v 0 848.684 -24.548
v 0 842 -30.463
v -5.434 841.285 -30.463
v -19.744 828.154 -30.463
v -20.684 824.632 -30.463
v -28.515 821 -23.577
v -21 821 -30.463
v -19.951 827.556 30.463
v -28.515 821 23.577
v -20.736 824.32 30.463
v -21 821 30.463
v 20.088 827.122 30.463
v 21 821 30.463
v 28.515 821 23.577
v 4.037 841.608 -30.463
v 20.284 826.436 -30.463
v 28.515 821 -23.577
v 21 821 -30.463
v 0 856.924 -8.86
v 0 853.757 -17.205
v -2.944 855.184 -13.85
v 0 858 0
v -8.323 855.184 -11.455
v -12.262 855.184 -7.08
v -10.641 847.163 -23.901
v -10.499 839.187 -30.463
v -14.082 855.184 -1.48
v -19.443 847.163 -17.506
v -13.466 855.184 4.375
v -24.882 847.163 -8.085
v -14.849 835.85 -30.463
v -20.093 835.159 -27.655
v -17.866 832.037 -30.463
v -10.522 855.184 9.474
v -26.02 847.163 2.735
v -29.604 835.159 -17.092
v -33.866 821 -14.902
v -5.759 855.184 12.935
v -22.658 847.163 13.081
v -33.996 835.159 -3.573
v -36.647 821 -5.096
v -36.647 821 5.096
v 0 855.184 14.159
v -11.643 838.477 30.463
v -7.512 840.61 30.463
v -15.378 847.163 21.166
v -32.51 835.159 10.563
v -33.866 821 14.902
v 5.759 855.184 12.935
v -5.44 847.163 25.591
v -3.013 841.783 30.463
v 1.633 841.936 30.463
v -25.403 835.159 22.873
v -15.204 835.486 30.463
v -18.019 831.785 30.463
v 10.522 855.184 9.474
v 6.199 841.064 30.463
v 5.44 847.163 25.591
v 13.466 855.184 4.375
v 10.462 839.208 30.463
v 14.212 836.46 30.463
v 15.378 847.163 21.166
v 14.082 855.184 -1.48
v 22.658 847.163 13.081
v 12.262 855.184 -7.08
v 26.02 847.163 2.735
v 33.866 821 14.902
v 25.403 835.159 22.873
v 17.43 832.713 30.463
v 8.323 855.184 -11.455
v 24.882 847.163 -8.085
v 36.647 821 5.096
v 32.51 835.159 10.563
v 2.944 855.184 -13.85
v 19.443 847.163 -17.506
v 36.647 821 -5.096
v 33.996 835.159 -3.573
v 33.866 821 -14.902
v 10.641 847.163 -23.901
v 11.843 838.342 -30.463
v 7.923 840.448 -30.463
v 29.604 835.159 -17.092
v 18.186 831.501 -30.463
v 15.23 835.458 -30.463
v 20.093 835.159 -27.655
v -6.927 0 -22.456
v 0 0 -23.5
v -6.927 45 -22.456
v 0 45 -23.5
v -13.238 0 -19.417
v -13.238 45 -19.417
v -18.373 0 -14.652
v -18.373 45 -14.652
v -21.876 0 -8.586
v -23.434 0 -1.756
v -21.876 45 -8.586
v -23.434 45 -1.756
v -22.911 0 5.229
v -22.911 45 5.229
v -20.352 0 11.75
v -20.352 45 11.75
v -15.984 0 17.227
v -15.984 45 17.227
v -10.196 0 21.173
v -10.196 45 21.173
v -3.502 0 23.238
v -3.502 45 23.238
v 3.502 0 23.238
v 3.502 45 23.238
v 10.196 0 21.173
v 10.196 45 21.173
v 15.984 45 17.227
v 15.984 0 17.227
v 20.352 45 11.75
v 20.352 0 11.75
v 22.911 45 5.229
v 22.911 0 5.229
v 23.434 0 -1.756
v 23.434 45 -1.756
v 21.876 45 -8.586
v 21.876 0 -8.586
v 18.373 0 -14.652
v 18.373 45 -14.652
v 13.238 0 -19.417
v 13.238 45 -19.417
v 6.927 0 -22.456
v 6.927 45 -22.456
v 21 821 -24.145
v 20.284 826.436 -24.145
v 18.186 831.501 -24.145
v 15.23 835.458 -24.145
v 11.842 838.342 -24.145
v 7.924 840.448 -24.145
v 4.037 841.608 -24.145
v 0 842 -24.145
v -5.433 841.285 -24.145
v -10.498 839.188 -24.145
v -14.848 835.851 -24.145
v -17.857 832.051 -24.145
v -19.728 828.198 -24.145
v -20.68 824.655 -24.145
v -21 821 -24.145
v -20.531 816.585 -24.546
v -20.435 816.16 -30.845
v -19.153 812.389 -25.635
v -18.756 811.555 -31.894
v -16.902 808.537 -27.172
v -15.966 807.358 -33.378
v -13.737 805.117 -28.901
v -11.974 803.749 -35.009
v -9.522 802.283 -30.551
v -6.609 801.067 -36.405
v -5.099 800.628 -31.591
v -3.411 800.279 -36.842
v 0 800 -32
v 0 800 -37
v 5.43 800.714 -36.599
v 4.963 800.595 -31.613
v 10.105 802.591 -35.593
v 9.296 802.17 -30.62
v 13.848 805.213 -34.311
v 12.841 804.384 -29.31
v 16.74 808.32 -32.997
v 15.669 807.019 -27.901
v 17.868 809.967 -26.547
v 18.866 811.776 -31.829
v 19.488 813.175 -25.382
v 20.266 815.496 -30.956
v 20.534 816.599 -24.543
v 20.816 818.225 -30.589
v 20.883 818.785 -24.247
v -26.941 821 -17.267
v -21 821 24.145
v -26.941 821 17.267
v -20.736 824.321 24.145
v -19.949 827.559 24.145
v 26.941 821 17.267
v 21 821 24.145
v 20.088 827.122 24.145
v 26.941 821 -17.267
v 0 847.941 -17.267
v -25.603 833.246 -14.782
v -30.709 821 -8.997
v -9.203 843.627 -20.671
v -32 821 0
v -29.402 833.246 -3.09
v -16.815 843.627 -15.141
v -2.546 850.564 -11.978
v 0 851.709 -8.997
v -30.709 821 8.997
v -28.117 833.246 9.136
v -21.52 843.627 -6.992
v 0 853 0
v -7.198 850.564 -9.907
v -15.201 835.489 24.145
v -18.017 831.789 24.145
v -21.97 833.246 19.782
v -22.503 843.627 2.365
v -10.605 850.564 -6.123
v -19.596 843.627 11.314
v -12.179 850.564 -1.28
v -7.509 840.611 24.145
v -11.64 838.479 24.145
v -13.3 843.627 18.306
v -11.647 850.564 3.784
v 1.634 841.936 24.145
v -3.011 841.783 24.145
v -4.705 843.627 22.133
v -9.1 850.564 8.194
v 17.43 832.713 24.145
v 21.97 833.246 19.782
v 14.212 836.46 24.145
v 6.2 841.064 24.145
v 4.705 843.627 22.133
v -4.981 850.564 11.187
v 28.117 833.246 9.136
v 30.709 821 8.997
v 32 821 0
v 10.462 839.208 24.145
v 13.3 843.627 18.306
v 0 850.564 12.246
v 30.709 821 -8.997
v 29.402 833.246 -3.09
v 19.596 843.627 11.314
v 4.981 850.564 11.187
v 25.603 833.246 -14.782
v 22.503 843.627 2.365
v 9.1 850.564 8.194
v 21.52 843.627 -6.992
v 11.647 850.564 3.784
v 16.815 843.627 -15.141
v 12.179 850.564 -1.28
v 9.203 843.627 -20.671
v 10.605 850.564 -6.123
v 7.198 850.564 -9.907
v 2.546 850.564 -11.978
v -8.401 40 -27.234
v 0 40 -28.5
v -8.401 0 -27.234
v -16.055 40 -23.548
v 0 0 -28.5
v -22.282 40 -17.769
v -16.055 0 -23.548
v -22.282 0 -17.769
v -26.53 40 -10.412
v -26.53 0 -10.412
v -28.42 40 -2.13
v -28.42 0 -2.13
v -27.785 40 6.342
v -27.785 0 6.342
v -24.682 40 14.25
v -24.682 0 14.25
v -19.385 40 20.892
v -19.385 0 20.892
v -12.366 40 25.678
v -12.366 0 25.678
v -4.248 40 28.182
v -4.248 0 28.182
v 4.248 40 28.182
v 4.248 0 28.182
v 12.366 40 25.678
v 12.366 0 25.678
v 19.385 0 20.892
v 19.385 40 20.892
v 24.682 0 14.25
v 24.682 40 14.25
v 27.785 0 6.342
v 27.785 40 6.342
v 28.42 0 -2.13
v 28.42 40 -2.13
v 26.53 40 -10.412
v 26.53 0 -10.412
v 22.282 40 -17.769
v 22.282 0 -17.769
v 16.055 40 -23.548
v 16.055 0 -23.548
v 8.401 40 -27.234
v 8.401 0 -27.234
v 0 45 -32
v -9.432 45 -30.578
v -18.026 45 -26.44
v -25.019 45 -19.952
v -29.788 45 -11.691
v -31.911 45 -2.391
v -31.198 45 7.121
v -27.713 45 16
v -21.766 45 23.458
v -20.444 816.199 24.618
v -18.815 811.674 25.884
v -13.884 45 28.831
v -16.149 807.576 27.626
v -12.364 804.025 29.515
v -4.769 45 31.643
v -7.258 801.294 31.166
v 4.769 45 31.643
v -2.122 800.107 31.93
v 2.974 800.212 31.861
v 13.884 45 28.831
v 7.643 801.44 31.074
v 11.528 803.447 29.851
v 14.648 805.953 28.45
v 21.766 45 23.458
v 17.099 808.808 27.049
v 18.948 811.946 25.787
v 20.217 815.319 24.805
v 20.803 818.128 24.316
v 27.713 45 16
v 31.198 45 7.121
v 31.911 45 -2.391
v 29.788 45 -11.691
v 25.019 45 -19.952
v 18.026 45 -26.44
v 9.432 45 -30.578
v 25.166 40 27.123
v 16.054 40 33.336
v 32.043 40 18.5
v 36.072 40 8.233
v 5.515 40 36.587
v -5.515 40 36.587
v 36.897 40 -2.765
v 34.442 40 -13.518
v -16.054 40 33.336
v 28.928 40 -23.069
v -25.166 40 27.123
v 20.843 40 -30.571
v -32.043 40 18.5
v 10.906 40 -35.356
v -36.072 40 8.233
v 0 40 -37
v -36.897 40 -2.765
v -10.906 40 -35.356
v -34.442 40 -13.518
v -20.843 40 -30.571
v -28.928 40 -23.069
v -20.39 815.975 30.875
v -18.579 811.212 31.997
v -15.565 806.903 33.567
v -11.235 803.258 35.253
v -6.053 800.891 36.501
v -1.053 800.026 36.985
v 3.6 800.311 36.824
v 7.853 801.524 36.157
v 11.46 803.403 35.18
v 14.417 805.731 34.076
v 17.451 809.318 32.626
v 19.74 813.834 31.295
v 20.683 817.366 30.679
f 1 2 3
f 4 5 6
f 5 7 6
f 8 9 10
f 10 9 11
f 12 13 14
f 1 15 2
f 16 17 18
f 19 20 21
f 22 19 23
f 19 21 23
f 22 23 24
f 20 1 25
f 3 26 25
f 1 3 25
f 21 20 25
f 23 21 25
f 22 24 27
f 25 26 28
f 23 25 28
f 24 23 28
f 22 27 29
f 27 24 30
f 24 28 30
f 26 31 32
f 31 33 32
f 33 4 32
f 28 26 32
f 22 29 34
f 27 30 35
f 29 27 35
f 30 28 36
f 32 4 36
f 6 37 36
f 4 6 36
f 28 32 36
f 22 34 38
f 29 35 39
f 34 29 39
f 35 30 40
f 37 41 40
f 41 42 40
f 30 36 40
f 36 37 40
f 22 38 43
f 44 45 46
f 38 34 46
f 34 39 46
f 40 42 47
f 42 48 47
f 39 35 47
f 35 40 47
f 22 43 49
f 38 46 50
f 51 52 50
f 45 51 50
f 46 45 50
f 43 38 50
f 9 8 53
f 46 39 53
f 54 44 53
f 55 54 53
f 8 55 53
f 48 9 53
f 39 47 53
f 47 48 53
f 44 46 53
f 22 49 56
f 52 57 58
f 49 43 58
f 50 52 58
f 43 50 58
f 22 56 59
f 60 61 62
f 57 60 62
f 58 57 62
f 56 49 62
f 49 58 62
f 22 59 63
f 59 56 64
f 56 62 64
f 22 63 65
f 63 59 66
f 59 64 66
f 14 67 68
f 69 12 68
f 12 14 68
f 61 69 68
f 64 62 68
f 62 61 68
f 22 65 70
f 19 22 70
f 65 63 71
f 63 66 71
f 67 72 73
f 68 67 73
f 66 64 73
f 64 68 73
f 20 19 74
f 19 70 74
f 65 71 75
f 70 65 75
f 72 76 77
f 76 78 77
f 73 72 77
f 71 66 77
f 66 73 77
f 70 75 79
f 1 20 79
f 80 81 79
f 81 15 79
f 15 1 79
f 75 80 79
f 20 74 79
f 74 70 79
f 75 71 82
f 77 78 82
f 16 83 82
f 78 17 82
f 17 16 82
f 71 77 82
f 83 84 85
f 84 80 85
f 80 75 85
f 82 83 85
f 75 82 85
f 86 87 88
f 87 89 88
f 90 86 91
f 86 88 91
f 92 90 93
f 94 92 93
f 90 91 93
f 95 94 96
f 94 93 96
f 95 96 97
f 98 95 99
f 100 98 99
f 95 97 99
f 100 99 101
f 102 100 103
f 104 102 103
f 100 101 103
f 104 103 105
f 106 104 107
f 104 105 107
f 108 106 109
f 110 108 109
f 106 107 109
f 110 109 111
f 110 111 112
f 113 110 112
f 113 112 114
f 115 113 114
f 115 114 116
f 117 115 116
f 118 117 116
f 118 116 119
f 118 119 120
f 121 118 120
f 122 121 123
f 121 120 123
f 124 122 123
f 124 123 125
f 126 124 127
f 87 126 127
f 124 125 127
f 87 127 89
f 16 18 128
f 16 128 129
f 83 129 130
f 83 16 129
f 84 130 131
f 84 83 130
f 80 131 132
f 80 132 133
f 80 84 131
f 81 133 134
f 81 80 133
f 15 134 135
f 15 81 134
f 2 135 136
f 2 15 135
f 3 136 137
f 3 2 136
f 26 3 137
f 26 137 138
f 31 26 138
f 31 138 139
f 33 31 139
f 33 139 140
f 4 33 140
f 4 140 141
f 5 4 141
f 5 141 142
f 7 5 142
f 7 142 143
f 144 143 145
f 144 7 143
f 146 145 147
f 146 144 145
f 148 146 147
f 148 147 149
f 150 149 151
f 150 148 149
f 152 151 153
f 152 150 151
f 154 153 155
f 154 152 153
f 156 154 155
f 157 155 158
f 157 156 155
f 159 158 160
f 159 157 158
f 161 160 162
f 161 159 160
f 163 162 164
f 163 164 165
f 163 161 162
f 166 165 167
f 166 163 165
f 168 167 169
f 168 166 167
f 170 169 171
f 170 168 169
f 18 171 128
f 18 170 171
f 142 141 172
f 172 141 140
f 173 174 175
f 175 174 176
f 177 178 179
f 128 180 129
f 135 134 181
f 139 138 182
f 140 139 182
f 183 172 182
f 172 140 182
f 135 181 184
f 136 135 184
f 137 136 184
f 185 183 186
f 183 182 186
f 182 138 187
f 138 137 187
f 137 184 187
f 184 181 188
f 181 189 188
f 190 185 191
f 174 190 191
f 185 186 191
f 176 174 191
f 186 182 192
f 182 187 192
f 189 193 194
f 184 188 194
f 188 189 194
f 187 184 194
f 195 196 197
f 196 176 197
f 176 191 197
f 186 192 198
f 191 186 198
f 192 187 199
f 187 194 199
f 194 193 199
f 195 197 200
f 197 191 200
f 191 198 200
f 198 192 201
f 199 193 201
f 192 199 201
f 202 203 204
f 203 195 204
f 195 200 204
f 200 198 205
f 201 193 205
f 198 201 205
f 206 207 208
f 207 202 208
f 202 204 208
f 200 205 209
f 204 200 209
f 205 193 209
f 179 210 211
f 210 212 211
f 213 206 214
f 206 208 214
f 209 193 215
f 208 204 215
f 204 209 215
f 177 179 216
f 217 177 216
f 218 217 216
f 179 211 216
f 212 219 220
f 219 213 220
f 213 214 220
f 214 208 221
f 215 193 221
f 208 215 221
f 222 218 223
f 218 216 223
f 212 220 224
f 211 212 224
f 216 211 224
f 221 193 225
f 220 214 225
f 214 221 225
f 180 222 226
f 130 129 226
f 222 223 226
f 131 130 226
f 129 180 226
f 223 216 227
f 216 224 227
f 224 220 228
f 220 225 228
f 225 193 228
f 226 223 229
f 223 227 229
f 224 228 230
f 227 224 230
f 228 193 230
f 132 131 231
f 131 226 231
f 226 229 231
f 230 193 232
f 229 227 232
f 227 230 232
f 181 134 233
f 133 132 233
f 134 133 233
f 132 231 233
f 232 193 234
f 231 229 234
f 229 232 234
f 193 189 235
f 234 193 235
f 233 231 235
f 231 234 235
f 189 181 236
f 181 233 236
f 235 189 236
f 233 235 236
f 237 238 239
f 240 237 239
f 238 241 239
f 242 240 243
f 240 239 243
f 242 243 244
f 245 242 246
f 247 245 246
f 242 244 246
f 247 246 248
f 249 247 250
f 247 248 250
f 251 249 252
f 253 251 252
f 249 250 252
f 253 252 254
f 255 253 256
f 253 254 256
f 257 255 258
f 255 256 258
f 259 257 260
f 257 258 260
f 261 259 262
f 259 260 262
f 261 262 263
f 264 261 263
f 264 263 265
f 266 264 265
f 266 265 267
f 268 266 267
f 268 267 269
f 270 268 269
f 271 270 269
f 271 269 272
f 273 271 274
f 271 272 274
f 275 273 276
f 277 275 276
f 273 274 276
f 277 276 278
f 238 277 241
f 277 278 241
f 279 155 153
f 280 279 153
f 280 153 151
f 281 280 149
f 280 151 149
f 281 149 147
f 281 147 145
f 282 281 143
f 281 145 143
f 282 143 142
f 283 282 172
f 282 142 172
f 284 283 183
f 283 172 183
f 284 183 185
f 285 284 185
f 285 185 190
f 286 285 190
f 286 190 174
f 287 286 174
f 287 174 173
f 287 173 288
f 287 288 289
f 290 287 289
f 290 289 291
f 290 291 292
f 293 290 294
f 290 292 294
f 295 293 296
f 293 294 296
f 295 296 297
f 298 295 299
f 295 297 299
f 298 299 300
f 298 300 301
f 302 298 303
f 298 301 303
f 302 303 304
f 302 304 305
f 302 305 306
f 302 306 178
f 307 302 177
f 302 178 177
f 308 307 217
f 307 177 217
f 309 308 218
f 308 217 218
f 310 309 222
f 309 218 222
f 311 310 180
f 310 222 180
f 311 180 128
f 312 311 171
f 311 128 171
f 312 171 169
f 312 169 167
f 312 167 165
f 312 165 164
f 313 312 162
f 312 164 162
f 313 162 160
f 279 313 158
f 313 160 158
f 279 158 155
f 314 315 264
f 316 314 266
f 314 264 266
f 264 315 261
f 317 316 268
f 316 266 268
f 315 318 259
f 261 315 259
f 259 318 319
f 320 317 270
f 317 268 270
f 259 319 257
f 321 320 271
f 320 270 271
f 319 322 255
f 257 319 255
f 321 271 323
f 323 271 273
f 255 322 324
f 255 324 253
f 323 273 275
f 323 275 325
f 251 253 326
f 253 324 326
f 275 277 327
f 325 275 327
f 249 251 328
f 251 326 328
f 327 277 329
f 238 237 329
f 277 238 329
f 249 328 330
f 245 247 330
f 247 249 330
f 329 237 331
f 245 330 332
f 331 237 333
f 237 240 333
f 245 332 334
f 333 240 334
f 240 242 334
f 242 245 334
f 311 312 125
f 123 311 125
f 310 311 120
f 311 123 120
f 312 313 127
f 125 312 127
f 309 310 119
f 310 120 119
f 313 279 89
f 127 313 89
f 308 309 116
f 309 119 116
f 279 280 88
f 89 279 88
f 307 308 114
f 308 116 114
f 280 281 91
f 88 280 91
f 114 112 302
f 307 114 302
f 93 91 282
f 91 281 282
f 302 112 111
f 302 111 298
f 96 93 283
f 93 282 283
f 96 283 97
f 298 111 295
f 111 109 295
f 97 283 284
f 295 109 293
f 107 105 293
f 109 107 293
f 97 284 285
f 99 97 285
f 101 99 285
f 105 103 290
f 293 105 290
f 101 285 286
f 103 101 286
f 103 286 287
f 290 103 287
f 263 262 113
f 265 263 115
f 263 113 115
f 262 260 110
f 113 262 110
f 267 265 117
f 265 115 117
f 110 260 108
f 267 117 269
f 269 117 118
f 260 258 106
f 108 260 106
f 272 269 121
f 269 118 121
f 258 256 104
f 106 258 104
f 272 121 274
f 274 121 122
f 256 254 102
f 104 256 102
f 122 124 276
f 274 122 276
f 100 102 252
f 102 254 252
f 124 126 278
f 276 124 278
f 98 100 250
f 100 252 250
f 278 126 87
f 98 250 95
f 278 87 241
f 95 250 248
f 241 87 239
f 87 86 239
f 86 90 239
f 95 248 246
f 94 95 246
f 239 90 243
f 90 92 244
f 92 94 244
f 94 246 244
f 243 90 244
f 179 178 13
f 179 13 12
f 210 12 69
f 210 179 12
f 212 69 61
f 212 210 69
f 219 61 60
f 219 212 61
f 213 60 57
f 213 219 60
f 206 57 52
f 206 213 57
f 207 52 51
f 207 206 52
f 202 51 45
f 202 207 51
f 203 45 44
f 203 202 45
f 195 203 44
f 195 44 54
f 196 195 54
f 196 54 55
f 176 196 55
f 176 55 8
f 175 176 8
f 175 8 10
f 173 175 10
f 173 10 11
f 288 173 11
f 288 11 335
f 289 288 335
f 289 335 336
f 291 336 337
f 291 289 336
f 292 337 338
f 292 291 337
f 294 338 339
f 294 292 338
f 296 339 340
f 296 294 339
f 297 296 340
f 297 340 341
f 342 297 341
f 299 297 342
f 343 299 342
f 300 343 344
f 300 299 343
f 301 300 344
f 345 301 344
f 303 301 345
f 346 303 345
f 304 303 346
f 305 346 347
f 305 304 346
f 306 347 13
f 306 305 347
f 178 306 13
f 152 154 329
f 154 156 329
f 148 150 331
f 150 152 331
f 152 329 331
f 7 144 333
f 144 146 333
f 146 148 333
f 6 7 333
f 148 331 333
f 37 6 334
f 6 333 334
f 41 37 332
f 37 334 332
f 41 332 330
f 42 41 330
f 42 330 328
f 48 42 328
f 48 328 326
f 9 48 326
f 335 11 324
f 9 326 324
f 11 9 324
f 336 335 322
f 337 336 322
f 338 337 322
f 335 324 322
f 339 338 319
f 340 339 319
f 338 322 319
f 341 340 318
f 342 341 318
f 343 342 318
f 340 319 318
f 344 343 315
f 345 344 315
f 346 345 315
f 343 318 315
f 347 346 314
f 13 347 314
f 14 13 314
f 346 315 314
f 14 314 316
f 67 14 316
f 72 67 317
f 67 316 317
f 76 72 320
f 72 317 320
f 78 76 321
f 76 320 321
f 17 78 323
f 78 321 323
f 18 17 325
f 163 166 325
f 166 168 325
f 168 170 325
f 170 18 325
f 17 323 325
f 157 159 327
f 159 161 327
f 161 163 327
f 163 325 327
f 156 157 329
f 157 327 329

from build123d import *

# Parameters (mm, degrees)
CUT_EXTRUDE1_DEPTH      = 860.594090254
CUT_EXTRUDE1_DEPTH_BACK = 860.594090254
SKETCH2_R               = 21


with BuildPart() as part:
    # Sketch1 → Revolve1 (revolve)
    with BuildSketch(Plane.XY, mode=Mode.PRIVATE) as revolve1_sk:
        with BuildLine():
            ThreePointArc((32, 821), (22.627416998, 843.627416998), (0, 853))
            Line((0, 853), (0, 858))
            ThreePointArc((0, 858), (26.162950904, 847.162950904), (37, 821))
            Line((37, 821), (37, 40))
            Line((37, 40), (28.5, 40))
            Line((28.5, 40), (28.5, 0))
            Line((28.5, 0), (23.5, 0))
            Line((23.5, 0), (23.5, 45))
            Line((23.5, 45), (32, 45))
            Line((32, 45), (32, 821))
        make_face()
    revolve(revolve1_sk.sketch.rotate(Axis((0, 0, 0), (0, 1, 0)), 90), axis=Axis((0, 0, 0), (0, 1, 0)))

    # Sketch2 → Cut-Extrude1 (cut, two sides: drawn at the far end of the back side and taken through both)
    with BuildSketch(Plane.XY.offset(-CUT_EXTRUDE1_DEPTH_BACK)):
        with Locations((0, 821)):
            Circle(SKETCH2_R)
    extrude(amount=CUT_EXTRUDE1_DEPTH + CUT_EXTRUDE1_DEPTH_BACK, mode=Mode.SUBTRACT)


solid = part.part
